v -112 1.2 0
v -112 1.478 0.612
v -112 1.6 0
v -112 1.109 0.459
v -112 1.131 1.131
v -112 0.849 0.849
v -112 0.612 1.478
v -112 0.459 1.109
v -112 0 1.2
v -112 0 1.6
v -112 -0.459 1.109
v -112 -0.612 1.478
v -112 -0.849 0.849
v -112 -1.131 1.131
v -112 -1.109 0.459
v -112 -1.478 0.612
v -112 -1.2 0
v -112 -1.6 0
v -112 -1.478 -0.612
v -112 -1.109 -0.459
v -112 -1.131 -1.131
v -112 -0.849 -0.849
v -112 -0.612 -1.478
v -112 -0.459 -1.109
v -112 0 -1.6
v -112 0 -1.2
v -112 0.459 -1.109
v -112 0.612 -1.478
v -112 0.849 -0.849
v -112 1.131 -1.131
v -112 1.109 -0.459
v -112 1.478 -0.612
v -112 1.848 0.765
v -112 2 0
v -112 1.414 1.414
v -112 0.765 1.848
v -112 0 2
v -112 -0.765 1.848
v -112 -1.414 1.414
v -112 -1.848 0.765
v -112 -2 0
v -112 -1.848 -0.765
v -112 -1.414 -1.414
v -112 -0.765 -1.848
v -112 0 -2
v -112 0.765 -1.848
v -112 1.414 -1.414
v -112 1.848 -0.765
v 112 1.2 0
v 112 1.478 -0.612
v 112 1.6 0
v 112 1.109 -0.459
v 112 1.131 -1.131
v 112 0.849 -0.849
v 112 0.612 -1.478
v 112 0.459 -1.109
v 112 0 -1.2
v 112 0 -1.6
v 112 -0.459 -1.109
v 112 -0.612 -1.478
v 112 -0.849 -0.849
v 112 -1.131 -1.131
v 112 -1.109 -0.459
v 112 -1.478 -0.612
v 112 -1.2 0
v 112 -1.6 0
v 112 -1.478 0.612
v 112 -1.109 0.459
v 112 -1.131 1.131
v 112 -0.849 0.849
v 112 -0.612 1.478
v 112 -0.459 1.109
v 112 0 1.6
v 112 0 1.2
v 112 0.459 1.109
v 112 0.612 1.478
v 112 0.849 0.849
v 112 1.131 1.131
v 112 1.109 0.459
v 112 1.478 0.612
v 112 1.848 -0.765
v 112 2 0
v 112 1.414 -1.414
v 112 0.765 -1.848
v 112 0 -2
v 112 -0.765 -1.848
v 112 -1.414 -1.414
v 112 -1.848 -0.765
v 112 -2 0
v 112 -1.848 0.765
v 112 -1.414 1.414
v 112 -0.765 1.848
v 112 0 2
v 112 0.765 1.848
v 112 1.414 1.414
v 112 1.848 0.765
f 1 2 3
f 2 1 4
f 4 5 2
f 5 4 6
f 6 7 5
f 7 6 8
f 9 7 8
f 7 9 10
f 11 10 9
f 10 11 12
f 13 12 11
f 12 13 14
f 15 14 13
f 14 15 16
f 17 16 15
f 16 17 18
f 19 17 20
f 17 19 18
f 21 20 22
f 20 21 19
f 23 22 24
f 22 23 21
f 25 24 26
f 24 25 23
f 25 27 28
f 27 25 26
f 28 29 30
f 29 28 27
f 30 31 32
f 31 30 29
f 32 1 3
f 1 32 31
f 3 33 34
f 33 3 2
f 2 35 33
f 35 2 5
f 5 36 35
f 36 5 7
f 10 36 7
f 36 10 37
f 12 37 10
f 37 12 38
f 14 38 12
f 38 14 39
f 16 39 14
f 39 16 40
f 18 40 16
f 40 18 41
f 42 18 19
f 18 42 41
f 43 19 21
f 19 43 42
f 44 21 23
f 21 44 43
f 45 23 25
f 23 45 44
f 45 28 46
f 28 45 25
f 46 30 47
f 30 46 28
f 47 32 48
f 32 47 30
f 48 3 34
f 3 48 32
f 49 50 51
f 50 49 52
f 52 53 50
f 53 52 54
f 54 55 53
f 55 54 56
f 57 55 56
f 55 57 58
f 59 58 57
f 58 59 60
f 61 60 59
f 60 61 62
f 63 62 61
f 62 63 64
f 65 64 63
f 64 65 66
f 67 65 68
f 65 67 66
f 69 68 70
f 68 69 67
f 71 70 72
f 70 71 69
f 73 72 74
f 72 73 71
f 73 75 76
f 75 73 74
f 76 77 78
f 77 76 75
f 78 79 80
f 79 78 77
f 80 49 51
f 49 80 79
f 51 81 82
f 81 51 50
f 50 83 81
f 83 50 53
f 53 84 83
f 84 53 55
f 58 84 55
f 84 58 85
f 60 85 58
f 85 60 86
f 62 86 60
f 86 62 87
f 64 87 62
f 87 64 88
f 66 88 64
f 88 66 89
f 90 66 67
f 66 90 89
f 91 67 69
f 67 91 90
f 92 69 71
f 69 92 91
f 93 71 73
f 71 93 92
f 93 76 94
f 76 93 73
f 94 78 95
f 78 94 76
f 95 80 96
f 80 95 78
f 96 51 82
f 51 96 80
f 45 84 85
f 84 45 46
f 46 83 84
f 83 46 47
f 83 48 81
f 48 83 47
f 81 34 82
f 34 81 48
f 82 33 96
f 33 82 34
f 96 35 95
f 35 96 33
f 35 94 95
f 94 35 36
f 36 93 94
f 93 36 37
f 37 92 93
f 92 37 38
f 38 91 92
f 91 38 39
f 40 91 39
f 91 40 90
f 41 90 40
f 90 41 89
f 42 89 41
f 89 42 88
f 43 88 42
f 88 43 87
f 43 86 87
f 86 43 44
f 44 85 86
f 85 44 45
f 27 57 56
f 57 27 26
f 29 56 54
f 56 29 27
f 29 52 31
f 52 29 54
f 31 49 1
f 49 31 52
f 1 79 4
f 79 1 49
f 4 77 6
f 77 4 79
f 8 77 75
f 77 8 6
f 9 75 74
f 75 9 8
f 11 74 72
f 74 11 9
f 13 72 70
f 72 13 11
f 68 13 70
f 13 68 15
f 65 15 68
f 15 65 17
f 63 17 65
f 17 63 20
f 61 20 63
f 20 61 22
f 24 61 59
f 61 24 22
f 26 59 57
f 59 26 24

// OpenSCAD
// file: ../p/4-4disc.scad
use <../lib.scad>
$fa=1; $fs=0.2;
function ldraw_lib__4_4disc(realsolid=false) = [
// 0 Disc 1.0
// 0 Name: 4-4disc.dat
// 0 Author: James Jessiman
// 0 !LDRAW_ORG Primitive UPDATE 2002-02
// 0 !LICENSE Licensed under CC BY 2.0 and CC BY 4.0 : see CAreadme.txt
// 
// 0 BFC CERTIFY CCW
  [0,"BFC","CERTIFY"],
  [0,"BFC","CCW"],
// 
// 0 !HISTORY 1998-12-15 [PTadmin] Official Update 1998-10
// 0 !HISTORY 2002-03-23 [sbliss] Added BFC statement
// 0 !HISTORY 2002-04-25 [PTadmin] Official Update 2002-02
// 0 !HISTORY 2007-06-24 [PTadmin] Header formatted for Contributor Agreement
// 0 !HISTORY 2008-07-01 [PTadmin] Official Update 2008-01
// 
// 
// 3 16 0 0 0 1 0 0 0.9239 0 0.3827
  [3,16,0,0,0,1,0,0,0.9239,0,0.3827],
// 3 16 0 0 0 0.9239 0 0.3827 0.7071 0 0.7071
  [3,16,0,0,0,0.9239,0,0.3827,0.7071,0,0.7071],
// 3 16 0 0 0 0.7071 0 0.7071 0.3827 0 0.9239
  [3,16,0,0,0,0.7071,0,0.7071,0.3827,0,0.9239],
// 3 16 0 0 0 0.3827 0 0.9239 0 0 1
  [3,16,0,0,0,0.3827,0,0.9239,0,0,1],
// 3 16 0 0 0 0 0 1 -0.3827 0 0.9239
  [3,16,0,0,0,0,0,1,-0.3827,0,0.9239],
// 3 16 0 0 0 -0.3827 0 0.9239 -0.7071 0 0.7071
  [3,16,0,0,0,-0.3827,0,0.9239,-0.7071,0,0.7071],
// 3 16 0 0 0 -0.7071 0 0.7071 -0.9239 0 0.3827
  [3,16,0,0,0,-0.7071,0,0.7071,-0.9239,0,0.3827],
// 3 16 0 0 0 -0.9239 0 0.3827 -1 0 -0
  [3,16,0,0,0,-0.9239,0,0.3827,-1,0,-0],
// 3 16 0 0 0 -1 0 -0 -0.9239 0 -0.3827
  [3,16,0,0,0,-1,0,-0,-0.9239,0,-0.3827],
// 3 16 0 0 0 -0.9239 0 -0.3827 -0.7071 0 -0.7071
  [3,16,0,0,0,-0.9239,0,-0.3827,-0.7071,0,-0.7071],
// 3 16 0 0 0 -0.7071 0 -0.7071 -0.3827 0 -0.9239
  [3,16,0,0,0,-0.7071,0,-0.7071,-0.3827,0,-0.9239],
// 3 16 0 0 0 -0.3827 0 -0.9239 0 0 -1
  [3,16,0,0,0,-0.3827,0,-0.9239,0,0,-1],
// 3 16 0 0 0 0 0 -1 0.3827 0 -0.9239
  [3,16,0,0,0,0,0,-1,0.3827,0,-0.9239],
// 3 16 0 0 0 0.3827 0 -0.9239 0.7071 0 -0.7071
  [3,16,0,0,0,0.3827,0,-0.9239,0.7071,0,-0.7071],
// 3 16 0 0 0 0.7071 0 -0.7071 0.9239 0 -0.3827
  [3,16,0,0,0,0.7071,0,-0.7071,0.9239,0,-0.3827],
// 3 16 0 0 0 0.9239 0 -0.3827 1 0 0
  [3,16,0,0,0,0.9239,0,-0.3827,1,0,0],
// 0
];
module ldraw_lib__4_4disc(step=0, col=false, unit=2/5, alt=false, line=0.2, solid=!$preview)
    makepoly(ldraw_lib__4_4disc(solid), step=step, col=col, unit=unit, alt=alt, line=line, solid=solid);
ldraw_lib__4_4disc(line=0.2);
// file: ../p/stud3.scad
use <../lib.scad>
use <4-4cyli.scad>
use <4-4disc.scad>
use <4-4edge.scad>
$fa=1; $fs=0.2;
function ldraw_lib__stud3(realsolid=false) = realsolid ? 
    [openscad(translate([0,0,-eps()], o=cylinder(4+eps(), r=4)),2)] : [
// 0 Stud Tube Solid
// 0 Name: stud3.dat
// 0 Author: James Jessiman
// 0 !LDRAW_ORG Primitive UPDATE 2012-01
// 0 !LICENSE Licensed under CC BY 2.0 and CC BY 4.0 : see CAreadme.txt
// 
// 0 BFC CERTIFY CCW
  [0,"BFC","CERTIFY"],
  [0,"BFC","CCW"],
// 
// 0 !HISTORY 2002-04-04 [sbliss] Modified for BFC compliance
// 0 !HISTORY 2002-04-25 [PTadmin] Official Update 2002-02
// 0 !HISTORY 2007-06-24 [PTadmin] Header formatted for Contributor Agreement
// 0 !HISTORY 2008-07-01 [PTadmin] Official Update 2008-01
// 0 !HISTORY 2012-02-16 [Philo] Changed to CCW
// 0 !HISTORY 2012-03-30 [PTadmin] Official Update 2012-01
// 
// 
// 1 16 0 -4 0 4 0 0 0 1 0 0 0 4 4-4edge.dat
  [1,16,0,-4,0,4,0,0,0,1,0,0,0,4, ldraw_lib__4_4edge(realsolid)],
// 1 16 0 0 0 4 0 0 0 1 0 0 0 4 4-4edge.dat
  [1,16,0,0,0,4,0,0,0,1,0,0,0,4, ldraw_lib__4_4edge(realsolid)],
// 1 16 0 -4 0 4 0 0 0 1 0 0 0 4 4-4disc.dat
  [1,16,0,-4,0,4,0,0,0,1,0,0,0,4, ldraw_lib__4_4disc(realsolid)],
// 1 16 0 -4 0 4 0 0 0 4 0 0 0 4 4-4cyli.dat
  [1,16,0,-4,0,4,0,0,0,4,0,0,0,4, ldraw_lib__4_4cyli(realsolid)],
];
module ldraw_lib__stud3(step=0, col=false, unit=2/5, alt=false, line=0.2, solid=!$preview)
    makepoly(ldraw_lib__stud3(solid), step=step, col=col, unit=unit, alt=alt, line=line, solid=solid);
ldraw_lib__stud3(line=0.2);
// file: ../p/stud.scad
use <../lib.scad>
use <4-4cyli.scad>
use <4-4disc.scad>
use <4-4edge.scad>
$fa=1; $fs=0.2;
function ldraw_lib__stud(realsolid=false) = realsolid ? 
    [openscad(translate([0,0,-eps()], o=cylinder(4+eps(), r=6)),2)] : [
// 0 Stud
// 0 Name: stud.dat
// 0 Author: James Jessiman
// 0 !LDRAW_ORG Primitive UPDATE 2012-01
// 0 !LICENSE Licensed under CC BY 2.0 and CC BY 4.0 : see CAreadme.txt
// 
// 0 BFC CERTIFY CCW
  [0,"BFC","CERTIFY"],
  [0,"BFC","CCW"],
// 
// 0 !HISTORY 2002-04-04 [sbliss] Modified for BFC compliance
// 0 !HISTORY 2002-04-25 [PTadmin] Official Update 2002-02
// 0 !HISTORY 2007-06-24 [PTadmin] Header formatted for Contributor Agreement
// 0 !HISTORY 2008-07-01 [PTadmin] Official Update 2008-01
// 0 !HISTORY 2012-02-16 [Philo] Changed to CCW
// 0 !HISTORY 2012-03-30 [PTadmin] Official Update 2012-01
// 
// 
// 1 16 0 0 0 6 0 0 0 1 0 0 0 6 4-4edge.dat
  [1,16,0,0,0,6,0,0,0,1,0,0,0,6, ldraw_lib__4_4edge(realsolid)],
// 1 16 0 -4 0 6 0 0 0 1 0 0 0 6 4-4edge.dat
  [1,16,0,-4,0,6,0,0,0,1,0,0,0,6, ldraw_lib__4_4edge(realsolid)],
// 1 16 0 0 0 6 0 0 0 -4 0 0 0 6 4-4cyli.dat
  [1,16,0,0,0,6,0,0,0,-4,0,0,0,6, ldraw_lib__4_4cyli(realsolid)],
// 1 16 0 -4 0 6 0 0 0 1 0 0 0 6 4-4disc.dat
  [1,16,0,-4,0,6,0,0,0,1,0,0,0,6, ldraw_lib__4_4disc(realsolid)],
];
module ldraw_lib__stud(step=0, col=false, unit=2/5, alt=false, line=0.2, solid=!$preview)
    makepoly(ldraw_lib__stud(solid), step=step, col=col, unit=unit, alt=alt, line=line, solid=solid);
ldraw_lib__stud(line=0.2);
// file: ../p/box5.scad
use <../lib.scad>
$fa=1; $fs=0.2;
function ldraw_lib__box5(realsolid=false) = [
// 0 Box with 5 Faces and All Edges
// 0 Name: box5.dat
// 0 Author: James Jessiman
// 0 !LDRAW_ORG Primitive UPDATE 2012-01
// 0 !LICENSE Licensed under CC BY 2.0 and CC BY 4.0 : see CAreadme.txt
// 
// 0 BFC CERTIFY CCW
  [0,"BFC","CERTIFY"],
  [0,"BFC","CCW"],
// 
// 0 !HISTORY 2002-04-03 [sbliss] Modified for BFC compliance
// 0 !HISTORY 2002-04-25 [PTadmin] Official Update 2002-02
// 0 !HISTORY 2007-06-24 [PTadmin] Header formatted for Contributor Agreement
// 0 !HISTORY 2008-07-01 [PTadmin] Official Update 2008-01
// 0 !HISTORY 2012-02-16 [Philo] Changed to CCW
// 0 !HISTORY 2012-03-30 [PTadmin] Official Update 2012-01
// 
// 
// 2 24 1 1 1 -1 1 1
  [2,24,1,1,1,-1,1,1],
// 2 24 -1 1 1 -1 1 -1
  [2,24,-1,1,1,-1,1,-1],
// 2 24 -1 1 -1 1 1 -1
  [2,24,-1,1,-1,1,1,-1],
// 2 24 1 1 -1 1 1 1
  [2,24,1,1,-1,1,1,1],
// 2 24 1 0 1 -1 0 1
  [2,24,1,0,1,-1,0,1],
// 2 24 -1 0 1 -1 0 -1
  [2,24,-1,0,1,-1,0,-1],
// 2 24 -1 0 -1 1 0 -1
  [2,24,-1,0,-1,1,0,-1],
// 2 24 1 0 -1 1 0 1
  [2,24,1,0,-1,1,0,1],
// 2 24 1 0 1 1 1 1
  [2,24,1,0,1,1,1,1],
// 2 24 -1 0 1 -1 1 1
  [2,24,-1,0,1,-1,1,1],
// 2 24 1 0 -1 1 1 -1
  [2,24,1,0,-1,1,1,-1],
// 2 24 -1 0 -1 -1 1 -1
  [2,24,-1,0,-1,-1,1,-1],
// 4 16 -1 1 1 1 1 1 1 1 -1 -1 1 -1
  [4,16,-1,1,1,1,1,1,1,1,-1,-1,1,-1],
// 4 16 -1 1 1 -1 0 1 1 0 1 1 1 1
  [4,16,-1,1,1,-1,0,1,1,0,1,1,1,1],
// 4 16 -1 1 -1 -1 0 -1 -1 0 1 -1 1 1
  [4,16,-1,1,-1,-1,0,-1,-1,0,1,-1,1,1],
// 4 16 1 1 -1 1 0 -1 -1 0 -1 -1 1 -1
  [4,16,1,1,-1,1,0,-1,-1,0,-1,-1,1,-1],
// 4 16 1 1 1 1 0 1 1 0 -1 1 1 -1
  [4,16,1,1,1,1,0,1,1,0,-1,1,1,-1],
];
module ldraw_lib__box5(step=0, col=false, unit=2/5, alt=false, line=0.2, solid=!$preview)
    makepoly(ldraw_lib__box5(solid), step=step, col=col, unit=unit, alt=alt, line=line, solid=solid);
ldraw_lib__box5(line=0.2);
// file: ../p/box4t.scad
use <../lib.scad>
$fa=1; $fs=0.2;
function ldraw_lib__box4t(realsolid=false) = [
// 0 Box with 4 Adjacent Faces and All Edges
// 0 Name: box4t.dat
// 0 Author: Tore Eriksson [Tore_Eriksson]
// 0 !LDRAW_ORG Primitive UPDATE 2003-02
// 0 !LICENSE Licensed under CC BY 2.0 and CC BY 4.0 : see CAreadme.txt
// 
// 0 BFC CERTIFY CCW
  [0,"BFC","CERTIFY"],
  [0,"BFC","CCW"],
// 
// 0 !HISTORY 1997-09-29 [PTadmin] Official Update 1997-15
// 0 !HISTORY 2002-08-31 [izanette] Modified with WINDZ for BFC compliance
// 0 !HISTORY 2003-08-01 [PTadmin] Official Update 2003-02
// 0 !HISTORY 2007-06-24 [PTadmin] Header formatted for Contributor Agreement
// 0 !HISTORY 2008-07-01 [PTadmin] Official Update 2008-01
// 
// 
// 2 24 1 1 1 -1 1 1
  [2,24,1,1,1,-1,1,1],
// 2 24 -1 1 1 -1 1 -1
  [2,24,-1,1,1,-1,1,-1],
// 2 24 -1 1 -1 1 1 -1
  [2,24,-1,1,-1,1,1,-1],
// 2 24 1 1 -1 1 1 1
  [2,24,1,1,-1,1,1,1],
// 2 24 1 0 1 -1 0 1
  [2,24,1,0,1,-1,0,1],
// 2 24 -1 0 1 -1 0 -1
  [2,24,-1,0,1,-1,0,-1],
// 2 24 -1 0 -1 1 0 -1
  [2,24,-1,0,-1,1,0,-1],
// 2 24 1 0 -1 1 0 1
  [2,24,1,0,-1,1,0,1],
// 2 24 1 0 1 1 1 1
  [2,24,1,0,1,1,1,1],
// 2 24 -1 0 1 -1 1 1
  [2,24,-1,0,1,-1,1,1],
// 2 24 1 0 -1 1 1 -1
  [2,24,1,0,-1,1,1,-1],
// 2 24 -1 0 -1 -1 1 -1
  [2,24,-1,0,-1,-1,1,-1],
// 4 16 1 1 1 1 1 -1 -1 1 -1 -1 1 1
  [4,16,1,1,1,1,1,-1,-1,1,-1,-1,1,1],
// 4 16 1 1 1 -1 1 1 -1 0 1 1 0 1
  [4,16,1,1,1,-1,1,1,-1,0,1,1,0,1],
// 4 16 -1 1 1 -1 1 -1 -1 0 -1 -1 0 1
  [4,16,-1,1,1,-1,1,-1,-1,0,-1,-1,0,1],
// 0 4 16 -1 1 -1 -1 0 -1 1 0 -1 1 1 -1
// 4 16 1 1 -1 1 1 1 1 0 1 1 0 -1
  [4,16,1,1,-1,1,1,1,1,0,1,1,0,-1],
// 0
];
module ldraw_lib__box4t(step=0, col=false, unit=2/5, alt=false, line=0.2, solid=!$preview)
    makepoly(ldraw_lib__box4t(solid), step=step, col=col, unit=unit, alt=alt, line=line, solid=solid);
ldraw_lib__box4t(line=0.2);
// file: s/3004s01.scad
use <../../lib.scad>
use <../../p/box4t.scad>
use <../../p/box5.scad>
use <../../p/stud.scad>
use <../../p/stud3.scad>
$fa=1; $fs=0.2;
function ldraw_lib__s__3004s01(realsolid=false) = [
// 0 ~Brick  1 x  2 without Front Face
// 0 Name: s\3004s01.dat
// 0 Author: James Jessiman
// 0 !LDRAW_ORG Subpart UPDATE 2003-03
// 0 !LICENSE Licensed under CC BY 2.0 and CC BY 4.0 : see CAreadme.txt
// 
// 0 BFC CERTIFY CCW
  [0,"BFC","CERTIFY"],
  [0,"BFC","CCW"],
// 
// 0 !HISTORY 2003-09-07 [jriley] Subfiling, BFC
// 0 !HISTORY 2003-12-19 [PTadmin] Official Update 2003-03
// 0 !HISTORY 2007-08-29 [PTadmin] Header formatted for Contributor Agreement
// 0 !HISTORY 2008-07-01 [PTadmin] Official Update 2008-01
// 
// 
// 1 16 0 4 0 1 0 0 0 -5 0 0 0 1 stud3.dat
  [1,16,0,4,0,1,0,0,0,-5,0,0,0,1, ldraw_lib__stud3(realsolid)],
// 0 BFC INVERTNEXT
  [0,"BFC","INVERTNEXT"],
// 1 16 0 24 0 16 0 0 0 -20 0 0 0 6 box5.dat
  [1,16,0,24,0,16,0,0,0,-20,0,0,0,6, ldraw_lib__box5(realsolid)],
// 4 16 20 24 10 16 24 6 -16 24 6 -20 24 10
  [4,16,20,24,10,16,24,6,-16,24,6,-20,24,10],
// 4 16 -20 24 10 -16 24 6 -16 24 -6 -20 24 -10
  [4,16,-20,24,10,-16,24,6,-16,24,-6,-20,24,-10],
// 4 16 -20 24 -10 -16 24 -6 16 24 -6 20 24 -10
  [4,16,-20,24,-10,-16,24,-6,16,24,-6,20,24,-10],
// 4 16 20 24 -10 16 24 -6 16 24 6 20 24 10
  [4,16,20,24,-10,16,24,-6,16,24,6,20,24,10],
// 1 16 0 24 0 20 0 0 0 -24 0 0 0 10 box4t.dat
  [1,16,0,24,0,20,0,0,0,-24,0,0,0,10, ldraw_lib__box4t(realsolid)],
// 1 16 10 0 0 1 0 0 0 1 0 0 0 1 stud.dat
  [1,16,10,0,0,1,0,0,0,1,0,0,0,1, ldraw_lib__stud(realsolid)],
// 1 16 -10 0 0 1 0 0 0 1 0 0 0 1 stud.dat
  [1,16,-10,0,0,1,0,0,0,1,0,0,0,1, ldraw_lib__stud(realsolid)],
// 0
];
module ldraw_lib__s__3004s01(step=0, col=false, unit=2/5, alt=false, line=0.2, solid=!$preview)
    makepoly(ldraw_lib__s__3004s01(solid), step=step, col=col, unit=unit, alt=alt, line=line, solid=solid);
ldraw_lib__s__3004s01(line=0.2);
// file: ../p/4-4cyli.scad
use <../lib.scad>
$fa=1; $fs=0.2;
function ldraw_lib__4_4cyli(realsolid=false) = [
// 0 Cylinder 1.0
// 0 Name: 4-4cyli.dat
// 0 Author: James Jessiman
// 0 !LDRAW_ORG Primitive UPDATE 2005-01
// 0 !LICENSE Licensed under CC BY 2.0 and CC BY 4.0 : see CAreadme.txt
// 
// 0 BFC CERTIFY CCW
  [0,"BFC","CERTIFY"],
  [0,"BFC","CCW"],
// 
// 0 !HISTORY 1998-12-15 [PTadmin] Official Update 1998-10
// 0 !HISTORY 2002-03-23 [sbliss] Added BFC statement; merged headers from files in distributions LDraw 0.27 and Complete.
// 0 !HISTORY 2002-04-25 [PTadmin] Official Update 2002-02
// 0 !HISTORY 2004-12-14 [guyvivan] BFC CCW
// 0 !HISTORY 2005-12-28 [PTadmin] Official Update 2005-01
// 0 !HISTORY 2007-06-24 [PTadmin] Header formatted for Contributor Agreement
// 0 !HISTORY 2008-07-01 [PTadmin] Official Update 2008-01
// 
// 
// 4 16 1 1 0 0.9239 1 0.3827 0.9239 0 0.3827 1 0 0
  [4,16,1,1,0,0.9239,1,0.3827,0.9239,0,0.3827,1,0,0],
// 5 24 1 0 0 1 1 0 0.9239 0 0.3827 0.9239 0 -0.3827
  [5,24,1,0,0,1,1,0,0.9239,0,0.3827,0.9239,0,-0.3827],
// 4 16 0.9239 1 0.3827 0.7071 1 0.7071 0.7071 0 0.7071 0.9239 0 0.3827
  [4,16,0.9239,1,0.3827,0.7071,1,0.7071,0.7071,0,0.7071,0.9239,0,0.3827],
// 5 24 0.9239 0 0.3827 0.9239 1 0.3827 0.7071 0 0.7071 1 0 0
  [5,24,0.9239,0,0.3827,0.9239,1,0.3827,0.7071,0,0.7071,1,0,0],
// 4 16 0.7071 1 0.7071 0.3827 1 0.9239 0.3827 0 0.9239 0.7071 0 0.7071
  [4,16,0.7071,1,0.7071,0.3827,1,0.9239,0.3827,0,0.9239,0.7071,0,0.7071],
// 5 24 0.7071 0 0.7071 0.7071 1 0.7071 0.3827 0 0.9239 0.9239 0 0.3827
  [5,24,0.7071,0,0.7071,0.7071,1,0.7071,0.3827,0,0.9239,0.9239,0,0.3827],
// 4 16 0.3827 1 0.9239 0 1 1 0 0 1 0.3827 0 0.9239
  [4,16,0.3827,1,0.9239,0,1,1,0,0,1,0.3827,0,0.9239],
// 5 24 0.3827 0 0.9239 0.3827 1 0.9239 0 0 1 0.7071 0 0.7071
  [5,24,0.3827,0,0.9239,0.3827,1,0.9239,0,0,1,0.7071,0,0.7071],
// 4 16 0 1 1 -0.3827 1 0.9239 -0.3827 0 0.9239 0 0 1
  [4,16,0,1,1,-0.3827,1,0.9239,-0.3827,0,0.9239,0,0,1],
// 5 24 0 0 1 0 1 1 -0.3827 0 0.9239 0.3827 0 0.9239
  [5,24,0,0,1,0,1,1,-0.3827,0,0.9239,0.3827,0,0.9239],
// 4 16 -0.3827 1 0.9239 -0.7071 1 0.7071 -0.7071 0 0.7071 -0.3827 0 0.9239
  [4,16,-0.3827,1,0.9239,-0.7071,1,0.7071,-0.7071,0,0.7071,-0.3827,0,0.9239],
// 5 24 -0.3827 0 0.9239 -0.3827 1 0.9239 -0.7071 0 0.7071 0 0 1
  [5,24,-0.3827,0,0.9239,-0.3827,1,0.9239,-0.7071,0,0.7071,0,0,1],
// 4 16 -0.7071 1 0.7071 -0.9239 1 0.3827 -0.9239 0 0.3827 -0.7071 0 0.7071
  [4,16,-0.7071,1,0.7071,-0.9239,1,0.3827,-0.9239,0,0.3827,-0.7071,0,0.7071],
// 5 24 -0.7071 0 0.7071 -0.7071 1 0.7071 -0.9239 0 0.3827 -0.3827 0 0.9239
  [5,24,-0.7071,0,0.7071,-0.7071,1,0.7071,-0.9239,0,0.3827,-0.3827,0,0.9239],
// 4 16 -0.9239 1 0.3827 -1 1 0 -1 0 0 -0.9239 0 0.3827
  [4,16,-0.9239,1,0.3827,-1,1,0,-1,0,0,-0.9239,0,0.3827],
// 5 24 -0.9239 0 0.3827 -0.9239 1 0.3827 -1 0 0 -0.7071 0 0.7071
  [5,24,-0.9239,0,0.3827,-0.9239,1,0.3827,-1,0,0,-0.7071,0,0.7071],
// 4 16 -1 1 0 -0.9239 1 -0.3827 -0.9239 0 -0.3827 -1 0 0
  [4,16,-1,1,0,-0.9239,1,-0.3827,-0.9239,0,-0.3827,-1,0,0],
// 5 24 -1 0 0 -1 1 0 -0.9239 0 -0.3827 -0.9239 0 0.3827
  [5,24,-1,0,0,-1,1,0,-0.9239,0,-0.3827,-0.9239,0,0.3827],
// 4 16 -0.9239 1 -0.3827 -0.7071 1 -0.7071 -0.7071 0 -0.7071 -0.9239 0 -0.3827
  [4,16,-0.9239,1,-0.3827,-0.7071,1,-0.7071,-0.7071,0,-0.7071,-0.9239,0,-0.3827],
// 5 24 -0.9239 0 -0.3827 -0.9239 1 -0.3827 -0.7071 0 -0.7071 -1 0 0
  [5,24,-0.9239,0,-0.3827,-0.9239,1,-0.3827,-0.7071,0,-0.7071,-1,0,0],
// 4 16 -0.7071 1 -0.7071 -0.3827 1 -0.9239 -0.3827 0 -0.9239 -0.7071 0 -0.7071
  [4,16,-0.7071,1,-0.7071,-0.3827,1,-0.9239,-0.3827,0,-0.9239,-0.7071,0,-0.7071],
// 5 24 -0.7071 0 -0.7071 -0.7071 1 -0.7071 -0.3827 0 -0.9239 -0.9239 0 -0.3827
  [5,24,-0.7071,0,-0.7071,-0.7071,1,-0.7071,-0.3827,0,-0.9239,-0.9239,0,-0.3827],
// 4 16 -0.3827 1 -0.9239 0 1 -1 0 0 -1 -0.3827 0 -0.9239
  [4,16,-0.3827,1,-0.9239,0,1,-1,0,0,-1,-0.3827,0,-0.9239],
// 5 24 -0.3827 0 -0.9239 -0.3827 1 -0.9239 0 0 -1 -0.7071 0 -0.7071
  [5,24,-0.3827,0,-0.9239,-0.3827,1,-0.9239,0,0,-1,-0.7071,0,-0.7071],
// 4 16 0 1 -1 0.3827 1 -0.9239 0.3827 0 -0.9239 0 0 -1
  [4,16,0,1,-1,0.3827,1,-0.9239,0.3827,0,-0.9239,0,0,-1],
// 5 24 0 0 -1 0 1 -1 0.3827 0 -0.9239 -0.3827 0 -0.9239
  [5,24,0,0,-1,0,1,-1,0.3827,0,-0.9239,-0.3827,0,-0.9239],
// 4 16 0.3827 1 -0.9239 0.7071 1 -0.7071 0.7071 0 -0.7071 0.3827 0 -0.9239
  [4,16,0.3827,1,-0.9239,0.7071,1,-0.7071,0.7071,0,-0.7071,0.3827,0,-0.9239],
// 5 24 0.3827 0 -0.9239 0.3827 1 -0.9239 0.7071 0 -0.7071 0 0 -1
  [5,24,0.3827,0,-0.9239,0.3827,1,-0.9239,0.7071,0,-0.7071,0,0,-1],
// 4 16 0.7071 1 -0.7071 0.9239 1 -0.3827 0.9239 0 -0.3827 0.7071 0 -0.7071
  [4,16,0.7071,1,-0.7071,0.9239,1,-0.3827,0.9239,0,-0.3827,0.7071,0,-0.7071],
// 5 24 0.7071 0 -0.7071 0.7071 1 -0.7071 0.9239 0 -0.3827 0.3827 0 -0.9239
  [5,24,0.7071,0,-0.7071,0.7071,1,-0.7071,0.9239,0,-0.3827,0.3827,0,-0.9239],
// 4 16 0.9239 1 -0.3827 1 1 0 1 0 0 0.9239 0 -0.3827
  [4,16,0.9239,1,-0.3827,1,1,0,1,0,0,0.9239,0,-0.3827],
// 5 24 0.9239 0 -0.3827 0.9239 1 -0.3827 1 0 0 0.7071 0 -0.7071
  [5,24,0.9239,0,-0.3827,0.9239,1,-0.3827,1,0,0,0.7071,0,-0.7071],
// 0
];
module ldraw_lib__4_4cyli(step=0, col=false, unit=2/5, alt=false, line=0.2, solid=!$preview)
    makepoly(ldraw_lib__4_4cyli(solid), step=step, col=col, unit=unit, alt=alt, line=line, solid=solid);
ldraw_lib__4_4cyli(line=0.2);
// file: ../p/4-4ring4.scad
use <../lib.scad>
$fa=1; $fs=0.2;
function ldraw_lib__4_4ring4(realsolid=false) = [
// 0 Ring  4 x 1.0
// 0 Name: 4-4ring4.dat
// 0 Author: James Jessiman
// 0 !LDRAW_ORG Primitive UPDATE 2009-01
// 0 !LICENSE Licensed under CC BY 2.0 and CC BY 4.0 : see CAreadme.txt
// 
// 0 BFC CERTIFY CCW
  [0,"BFC","CERTIFY"],
  [0,"BFC","CCW"],
// 
// 0 !HISTORY 1998-12-15 [PTadmin] Official Update 1998-10
// 0 !HISTORY 2002-04-08 [BrickCaster] Modified for BFC compliance
// 0 !HISTORY 2002-04-25 [PTadmin] Official Update 2002-02
// 0 !HISTORY 2007-06-24 [PTadmin] Header formatted for Contributor Agreement
// 0 !HISTORY 2008-07-01 [PTadmin] Official Update 2008-01
// 0 !HISTORY 2008-08-26 [cwdee] Switch polygon winding and rename
// 0 !HISTORY 2009-05-02 [PTadmin] Official Update 2009-01
// 
// 
// 4 16 -1.9135 0 4.6195 -1.5308 0 3.6956 0 0 4 0 0 5
  [4,16,-1.9135,0,4.6195,-1.5308,0,3.6956,0,0,4,0,0,5],
// 4 16 -3.5355 0 3.5355 -2.8284 0 2.8284 -1.5308 0 3.6956 -1.9135 0 4.6195
  [4,16,-3.5355,0,3.5355,-2.8284,0,2.8284,-1.5308,0,3.6956,-1.9135,0,4.6195],
// 4 16 -4.6195 0 1.9135 -3.6956 0 1.5308 -2.8284 0 2.8284 -3.5355 0 3.5355
  [4,16,-4.6195,0,1.9135,-3.6956,0,1.5308,-2.8284,0,2.8284,-3.5355,0,3.5355],
// 4 16 -5 0 0 -4 0 0 -3.6956 0 1.5308 -4.6195 0 1.9135
  [4,16,-5,0,0,-4,0,0,-3.6956,0,1.5308,-4.6195,0,1.9135],
// 4 16 -4.6195 0 -1.9135 -3.6956 0 -1.5308 -4 0 0 -5 0 0
  [4,16,-4.6195,0,-1.9135,-3.6956,0,-1.5308,-4,0,0,-5,0,0],
// 4 16 -3.5355 0 -3.5355 -2.8284 0 -2.8284 -3.6956 0 -1.5308 -4.6195 0 -1.9135
  [4,16,-3.5355,0,-3.5355,-2.8284,0,-2.8284,-3.6956,0,-1.5308,-4.6195,0,-1.9135],
// 4 16 -1.9135 0 -4.6195 -1.5308 0 -3.6956 -2.8284 0 -2.8284 -3.5355 0 -3.5355
  [4,16,-1.9135,0,-4.6195,-1.5308,0,-3.6956,-2.8284,0,-2.8284,-3.5355,0,-3.5355],
// 4 16 0 0 -5 0 0 -4 -1.5308 0 -3.6956 -1.9135 0 -4.6195
  [4,16,0,0,-5,0,0,-4,-1.5308,0,-3.6956,-1.9135,0,-4.6195],
// 4 16 1.9135 0 -4.6195 1.5308 0 -3.6956 0 0 -4 0 0 -5
  [4,16,1.9135,0,-4.6195,1.5308,0,-3.6956,0,0,-4,0,0,-5],
// 4 16 3.5355 0 -3.5355 2.8284 0 -2.8284 1.5308 0 -3.6956 1.9135 0 -4.6195
  [4,16,3.5355,0,-3.5355,2.8284,0,-2.8284,1.5308,0,-3.6956,1.9135,0,-4.6195],
// 4 16 4.6195 0 -1.9135 3.6956 0 -1.5308 2.8284 0 -2.8284 3.5355 0 -3.5355
  [4,16,4.6195,0,-1.9135,3.6956,0,-1.5308,2.8284,0,-2.8284,3.5355,0,-3.5355],
// 4 16 5 0 0 4 0 0 3.6956 0 -1.5308 4.6195 0 -1.9135
  [4,16,5,0,0,4,0,0,3.6956,0,-1.5308,4.6195,0,-1.9135],
// 4 16 4.6195 0 1.9135 3.6956 0 1.5308 4 0 0 5 0 0
  [4,16,4.6195,0,1.9135,3.6956,0,1.5308,4,0,0,5,0,0],
// 4 16 3.5355 0 3.5355 2.8284 0 2.8284 3.6956 0 1.5308 4.6195 0 1.9135
  [4,16,3.5355,0,3.5355,2.8284,0,2.8284,3.6956,0,1.5308,4.6195,0,1.9135],
// 4 16 1.9135 0 4.6195 1.5308 0 3.6956 2.8284 0 2.8284 3.5355 0 3.5355
  [4,16,1.9135,0,4.6195,1.5308,0,3.6956,2.8284,0,2.8284,3.5355,0,3.5355],
// 4 16 0 0 5 0 0 4 1.5308 0 3.6956 1.9135 0 4.6195
  [4,16,0,0,5,0,0,4,1.5308,0,3.6956,1.9135,0,4.6195],
// 0
];
module ldraw_lib__4_4ring4(step=0, col=false, unit=2/5, alt=false, line=0.2, solid=!$preview)
    makepoly(ldraw_lib__4_4ring4(solid), step=step, col=col, unit=unit, alt=alt, line=line, solid=solid);
ldraw_lib__4_4ring4(line=0.2);
// file: ../p/4-4ring3.scad
use <../lib.scad>
$fa=1; $fs=0.2;
function ldraw_lib__4_4ring3(realsolid=false) = [
// 0 Ring  3 x 1.0
// 0 Name: 4-4ring3.dat
// 0 Author: James Jessiman
// 0 !LDRAW_ORG Primitive UPDATE 2009-01
// 0 !LICENSE Licensed under CC BY 2.0 and CC BY 4.0 : see CAreadme.txt
// 
// 0 BFC CERTIFY CCW
  [0,"BFC","CERTIFY"],
  [0,"BFC","CCW"],
// 
// 0 !HISTORY 1998-12-15 [PTadmin] Official Update 1998-10
// 0 !HISTORY 2002-04-05 [hafhead] Added BFC statement
// 0 !HISTORY 2002-04-25 [PTadmin] Official Update 2002-02
// 0 !HISTORY 2007-06-24 [PTadmin] Header formatted for Contributor Agreement
// 0 !HISTORY 2008-07-01 [PTadmin] Official Update 2008-01
// 0 !HISTORY 2008-08-26 [cwdee] Switch polygon winding and rename
// 0 !HISTORY 2009-05-02 [PTadmin] Official Update 2009-01
// 
// 
// 4 16 -1.5308 0 3.6956 -1.1481 0 2.7717 0 0 3 0 0 4
  [4,16,-1.5308,0,3.6956,-1.1481,0,2.7717,0,0,3,0,0,4],
// 4 16 -2.8284 0 2.8284 -2.1213 0 2.1213 -1.1481 0 2.7717 -1.5308 0 3.6956
  [4,16,-2.8284,0,2.8284,-2.1213,0,2.1213,-1.1481,0,2.7717,-1.5308,0,3.6956],
// 4 16 -3.6956 0 1.5308 -2.7717 0 1.1481 -2.1213 0 2.1213 -2.8284 0 2.8284
  [4,16,-3.6956,0,1.5308,-2.7717,0,1.1481,-2.1213,0,2.1213,-2.8284,0,2.8284],
// 4 16 -4 0 0 -3 0 0 -2.7717 0 1.1481 -3.6956 0 1.5308
  [4,16,-4,0,0,-3,0,0,-2.7717,0,1.1481,-3.6956,0,1.5308],
// 4 16 -3.6956 0 -1.5308 -2.7717 0 -1.1481 -3 0 0 -4 0 0
  [4,16,-3.6956,0,-1.5308,-2.7717,0,-1.1481,-3,0,0,-4,0,0],
// 4 16 -2.8284 0 -2.8284 -2.1213 0 -2.1213 -2.7717 0 -1.1481 -3.6956 0 -1.5308
  [4,16,-2.8284,0,-2.8284,-2.1213,0,-2.1213,-2.7717,0,-1.1481,-3.6956,0,-1.5308],
// 4 16 -1.5308 0 -3.6956 -1.1481 0 -2.7717 -2.1213 0 -2.1213 -2.8284 0 -2.8284
  [4,16,-1.5308,0,-3.6956,-1.1481,0,-2.7717,-2.1213,0,-2.1213,-2.8284,0,-2.8284],
// 4 16 0 0 -4 0 0 -3 -1.1481 0 -2.7717 -1.5308 0 -3.6956
  [4,16,0,0,-4,0,0,-3,-1.1481,0,-2.7717,-1.5308,0,-3.6956],
// 4 16 1.5308 0 -3.6956 1.1481 0 -2.7717 0 0 -3 0 0 -4
  [4,16,1.5308,0,-3.6956,1.1481,0,-2.7717,0,0,-3,0,0,-4],
// 4 16 2.8284 0 -2.8284 2.1213 0 -2.1213 1.1481 0 -2.7717 1.5308 0 -3.6956
  [4,16,2.8284,0,-2.8284,2.1213,0,-2.1213,1.1481,0,-2.7717,1.5308,0,-3.6956],
// 4 16 3.6956 0 -1.5308 2.7717 0 -1.1481 2.1213 0 -2.1213 2.8284 0 -2.8284
  [4,16,3.6956,0,-1.5308,2.7717,0,-1.1481,2.1213,0,-2.1213,2.8284,0,-2.8284],
// 4 16 4 0 0 3 0 0 2.7717 0 -1.1481 3.6956 0 -1.5308
  [4,16,4,0,0,3,0,0,2.7717,0,-1.1481,3.6956,0,-1.5308],
// 4 16 3.6956 0 1.5308 2.7717 0 1.1481 3 0 0 4 0 0
  [4,16,3.6956,0,1.5308,2.7717,0,1.1481,3,0,0,4,0,0],
// 4 16 2.8284 0 2.8284 2.1213 0 2.1213 2.7717 0 1.1481 3.6956 0 1.5308
  [4,16,2.8284,0,2.8284,2.1213,0,2.1213,2.7717,0,1.1481,3.6956,0,1.5308],
// 4 16 1.5308 0 3.6956 1.1481 0 2.7717 2.1213 0 2.1213 2.8284 0 2.8284
  [4,16,1.5308,0,3.6956,1.1481,0,2.7717,2.1213,0,2.1213,2.8284,0,2.8284],
// 4 16 0 0 4 0 0 3 1.1481 0 2.7717 1.5308 0 3.6956
  [4,16,0,0,4,0,0,3,1.1481,0,2.7717,1.5308,0,3.6956],
// 0
];
module ldraw_lib__4_4ring3(step=0, col=false, unit=2/5, alt=false, line=0.2, solid=!$preview)
    makepoly(ldraw_lib__4_4ring3(solid), step=step, col=col, unit=unit, alt=alt, line=line, solid=solid);
ldraw_lib__4_4ring3(line=0.2);
// file: ../p/4-4edge.scad
use <../lib.scad>
$fa=1; $fs=0.2;
function ldraw_lib__4_4edge(realsolid=false) = [
// 0 Circle 1.0
// 0 Name: 4-4edge.dat
// 0 Author: James Jessiman
// 0 !LDRAW_ORG Primitive UPDATE 2017-01
// 0 !LICENSE Licensed under CC BY 2.0 and CC BY 4.0 : see CAreadme.txt
// 
// 0 BFC CERTIFY CCW
  [0,"BFC","CERTIFY"],
  [0,"BFC","CCW"],
// 
// 0 !HISTORY 1998-12-15 [PTadmin] Official Update 1998-10
// 0 !HISTORY 2005-12-28 [PTadmin] Official Update 2005-01
// 0 !HISTORY 2007-06-24 [PTadmin] Header formatted for Contributor Agreement
// 0 !HISTORY 2008-07-01 [PTadmin] Official Update 2008-01
// 0 !HISTORY 2017-01-15 [Steffen] BFCed
// 0 !HISTORY 2017-12-30 [PTadmin] Official Update 2017-01
// 
// 
// 2 24 1 0 0 0.9239 0 0.3827
  [2,24,1,0,0,0.9239,0,0.3827],
// 2 24 0.9239 0 0.3827 0.7071 0 0.7071
  [2,24,0.9239,0,0.3827,0.7071,0,0.7071],
// 2 24 0.7071 0 0.7071 0.3827 0 0.9239
  [2,24,0.7071,0,0.7071,0.3827,0,0.9239],
// 2 24 0.3827 0 0.9239 0 0 1
  [2,24,0.3827,0,0.9239,0,0,1],
// 2 24 0 0 1 -0.3827 0 0.9239
  [2,24,0,0,1,-0.3827,0,0.9239],
// 2 24 -0.3827 0 0.9239 -0.7071 0 0.7071
  [2,24,-0.3827,0,0.9239,-0.7071,0,0.7071],
// 2 24 -0.7071 0 0.7071 -0.9239 0 0.3827
  [2,24,-0.7071,0,0.7071,-0.9239,0,0.3827],
// 2 24 -0.9239 0 0.3827 -1 0 -0
  [2,24,-0.9239,0,0.3827,-1,0,-0],
// 2 24 -1 0 -0 -0.9239 0 -0.3827
  [2,24,-1,0,-0,-0.9239,0,-0.3827],
// 2 24 -0.9239 0 -0.3827 -0.7071 0 -0.7071
  [2,24,-0.9239,0,-0.3827,-0.7071,0,-0.7071],
// 2 24 -0.7071 0 -0.7071 -0.3827 0 -0.9239
  [2,24,-0.7071,0,-0.7071,-0.3827,0,-0.9239],
// 2 24 -0.3827 0 -0.9239 0 0 -1
  [2,24,-0.3827,0,-0.9239,0,0,-1],
// 2 24 0 0 -1 0.3827 0 -0.9239
  [2,24,0,0,-1,0.3827,0,-0.9239],
// 2 24 0.3827 0 -0.9239 0.7071 0 -0.7071
  [2,24,0.3827,0,-0.9239,0.7071,0,-0.7071],
// 2 24 0.7071 0 -0.7071 0.9239 0 -0.3827
  [2,24,0.7071,0,-0.7071,0.9239,0,-0.3827],
// 2 24 0.9239 0 -0.3827 1 0 0
  [2,24,0.9239,0,-0.3827,1,0,0],
];
module ldraw_lib__4_4edge(step=0, col=false, unit=2/5, alt=false, line=0.2, solid=!$preview)
    makepoly(ldraw_lib__4_4edge(solid), step=step, col=col, unit=unit, alt=alt, line=line, solid=solid);
ldraw_lib__4_4edge(line=0.2);
// file: 3004.scad
use <../lib.scad>
use <s/3004s01.scad>
$fa=1; $fs=0.2;
function ldraw_lib__3004(realsolid=false) = [
// 0 Brick  1 x  2
// 0 Name: 3004.dat
// 0 Author: James Jessiman
// 0 !LDRAW_ORG Part UPDATE 2022-05
// 0 !LICENSE Licensed under CC BY 2.0 and CC BY 4.0 : see CAreadme.txt
// 
// 0 BFC CERTIFY CCW
  [0,"BFC","CERTIFY"],
  [0,"BFC","CCW"],
// 
// 0 !HISTORY 2001-10-26 [PTadmin] Official Update 2001-01
// 0 !HISTORY 2002-05-07 {unknown} BFC Certification
// 0 !HISTORY 2002-06-11 [PTadmin] Official Update 2002-03
// 0 !HISTORY 2007-05-07 [PTadmin] Header formatted for Contributor Agreement
// 0 !HISTORY 2008-07-01 [PTadmin] Official Update 2008-01
// 0 !HISTORY 2022-08-04 [MagFors] Using subfile
// 0 !HISTORY 2022-09-15 [PTadmin] Official Update 2022-05
// 
// 
// 1 16 0 0 0 1 0 0 0 1 0 0 0 1 s\3004s01.dat
  [1,16,0,0,0,1,0,0,0,1,0,0,0,1, ldraw_lib__s__3004s01(realsolid)],
// 4 16 -20 24 -10 20 24 -10 20 0 -10 -20 0 -10
  [4,16,-20,24,-10,20,24,-10,20,0,-10,-20,0,-10],
];
module ldraw_lib__3004(step=0, col=false, unit=2/5, alt=false, line=0.2, solid=!$preview)
    makepoly(ldraw_lib__3004(solid), step=step, col=col, unit=unit, alt=alt, line=line, solid=solid);
ldraw_lib__3004(line=0.2);
// file: 71533k03.scad
use <../lib.scad>
use <../p/4-4cyli.scad>
$fa=1; $fs=0.2;
function ldraw_lib__71533k03(realsolid=false) = [
// 0 ~Technic Pneumatic Tube Segment
// 0 Name: 71533k03.dat
// 0 Author: Jaco van der Molen [Jaco]
// 0 !LDRAW_ORG Part Flexible_Section UPDATE 2020-01
// 0 !LICENSE Licensed under CC BY 2.0 and CC BY 4.0 : see CAreadme.txt
// 
// 0 BFC CERTIFY CW
  [0,"BFC","CERTIFY"],
  [0,"BFC","CW"],
// 
// 0 !HISTORY 2003-11-30 [Steffen] BFCed
// 0 !HISTORY 2009-12-29 [PTadmin] Official Update 2009-03
// 0 !HISTORY 2020-06-27 [PTadmin] Renamed from 166
// 0 !HISTORY 2020-06-28 [PTadmin] Official Update 2020-01
// 
// 
// 1 16 0 0 0 5 0 0 0 1 0 0 0 5 4-4cyli.dat
  [1,16,0,0,0,5,0,0,0,1,0,0,0,5, ldraw_lib__4_4cyli(realsolid)],
// 0 BFC INVERTNEXT
  [0,"BFC","INVERTNEXT"],
// 1 16 0 0 0 3 0 0 0 1 0 0 0 3 4-4cyli.dat
  [1,16,0,0,0,3,0,0,0,1,0,0,0,3, ldraw_lib__4_4cyli(realsolid)],
// 0
];
module ldraw_lib__71533k03(step=0, col=false, unit=2/5, alt=false, line=0.2, solid=!$preview)
    makepoly(ldraw_lib__71533k03(solid), step=step, col=col, unit=unit, alt=alt, line=line, solid=solid);
ldraw_lib__71533k03(line=0.2);
// file: 71533k02.scad
use <../lib.scad>
use <../p/4-4edge.scad>
use <../p/4-4ring3.scad>
use <../p/4-4ring4.scad>
$fa=1; $fs=0.2;
function ldraw_lib__71533k02(realsolid=false) = [
// 0 ~Technic Pneumatic Tube End (Non-Bulged)
// 0 Name: 71533k02.dat
// 0 Author: Steffen [Steffen]
// 0 !LDRAW_ORG Part Flexible_Section UPDATE 2020-01
// 0 !LICENSE Licensed under CC BY 2.0 and CC BY 4.0 : see CAreadme.txt
// 
// 0 BFC CERTIFY CCW
  [0,"BFC","CERTIFY"],
  [0,"BFC","CCW"],
// 
// 0 !HISTORY 2020-06-28 [PTadmin] Official Update 2020-01
// 
// 
// 0 // This file goes together with 71533k01.dat and 71533k03.dat.
// 0 // Those 3 files can be used to create Technic Pneumatic Tubes
// 0 // with either bulged or non-bulged ends.
// 
// 1 16 0 0 0 1 0 0 0 1 0 0 0 1 4-4ring3.dat
  [1,16,0,0,0,1,0,0,0,1,0,0,0,1, ldraw_lib__4_4ring3(realsolid)],
// 1 16 0 0 0 1 0 0 0 1 0 0 0 1 4-4ring4.dat
  [1,16,0,0,0,1,0,0,0,1,0,0,0,1, ldraw_lib__4_4ring4(realsolid)],
// 1 16 0 0 0 3 0 0 0 3 0 0 0 3 4-4edge.dat
  [1,16,0,0,0,3,0,0,0,3,0,0,0,3, ldraw_lib__4_4edge(realsolid)],
// 1 16 0 0 0 5 0 0 0 5 0 0 0 5 4-4edge.dat
  [1,16,0,0,0,5,0,0,0,5,0,0,0,5, ldraw_lib__4_4edge(realsolid)],
];
module ldraw_lib__71533k02(step=0, col=false, unit=2/5, alt=false, line=0.2, solid=!$preview)
    makepoly(ldraw_lib__71533k02(solid), step=step, col=col, unit=unit, alt=alt, line=line, solid=solid);
ldraw_lib__71533k02(line=0.2);
// main file
use <../lib.scad>
use <71533k02.scad>
use <71533k03.scad>
$fa=1; $fs=0.2;
function ldraw_lib__21825_f1(realsolid=false) = [
// 0 Technic Pneumatic Tube 28L
// 0 Name: 21825-f1.dat
// 0 Author: Philippe Hurbain [Philo]
// 0 !LDRAW_ORG Part UPDATE 2020-02
// 0 !LICENSE Licensed under CC BY 2.0 and CC BY 4.0 : see CAreadme.txt
// 
// 0 BFC CERTIFY CCW
  [0,"BFC","CERTIFY"],
  [0,"BFC","CCW"],
// 
// 0 !KEYWORDS 224 mm
// 
// 0 !HISTORY 2020-09-05 [PTadmin] Official Update 2020-02
// 
// 
// 1 16 -280 0 0 0 1 0 1 0 0 0 0 1 71533k02.dat
  [1,16,-280,0,0,0,1,0,1,0,0,0,0,1, ldraw_lib__71533k02(realsolid)],
// 1 16 280 0 0 0 -1 0 -1 0 0 0 0 1 71533k02.dat
  [1,16,280,0,0,0,-1,0,-1,0,0,0,0,1, ldraw_lib__71533k02(realsolid)],
// 1 16 -280 0 0 0 560 0 1 0 0 0 0 1 71533k03.dat
  [1,16,-280,0,0,0,560,0,1,0,0,0,0,1, ldraw_lib__71533k03(realsolid)],
];
module ldraw_lib__21825_f1(step=0, col=false, unit=2/5, alt=false, line=0.2, solid=!$preview)
    makepoly(ldraw_lib__21825_f1(solid), step=step, col=col, unit=unit, alt=alt, line=line, solid=solid);
ldraw_lib__21825_f1(line=0.2);
